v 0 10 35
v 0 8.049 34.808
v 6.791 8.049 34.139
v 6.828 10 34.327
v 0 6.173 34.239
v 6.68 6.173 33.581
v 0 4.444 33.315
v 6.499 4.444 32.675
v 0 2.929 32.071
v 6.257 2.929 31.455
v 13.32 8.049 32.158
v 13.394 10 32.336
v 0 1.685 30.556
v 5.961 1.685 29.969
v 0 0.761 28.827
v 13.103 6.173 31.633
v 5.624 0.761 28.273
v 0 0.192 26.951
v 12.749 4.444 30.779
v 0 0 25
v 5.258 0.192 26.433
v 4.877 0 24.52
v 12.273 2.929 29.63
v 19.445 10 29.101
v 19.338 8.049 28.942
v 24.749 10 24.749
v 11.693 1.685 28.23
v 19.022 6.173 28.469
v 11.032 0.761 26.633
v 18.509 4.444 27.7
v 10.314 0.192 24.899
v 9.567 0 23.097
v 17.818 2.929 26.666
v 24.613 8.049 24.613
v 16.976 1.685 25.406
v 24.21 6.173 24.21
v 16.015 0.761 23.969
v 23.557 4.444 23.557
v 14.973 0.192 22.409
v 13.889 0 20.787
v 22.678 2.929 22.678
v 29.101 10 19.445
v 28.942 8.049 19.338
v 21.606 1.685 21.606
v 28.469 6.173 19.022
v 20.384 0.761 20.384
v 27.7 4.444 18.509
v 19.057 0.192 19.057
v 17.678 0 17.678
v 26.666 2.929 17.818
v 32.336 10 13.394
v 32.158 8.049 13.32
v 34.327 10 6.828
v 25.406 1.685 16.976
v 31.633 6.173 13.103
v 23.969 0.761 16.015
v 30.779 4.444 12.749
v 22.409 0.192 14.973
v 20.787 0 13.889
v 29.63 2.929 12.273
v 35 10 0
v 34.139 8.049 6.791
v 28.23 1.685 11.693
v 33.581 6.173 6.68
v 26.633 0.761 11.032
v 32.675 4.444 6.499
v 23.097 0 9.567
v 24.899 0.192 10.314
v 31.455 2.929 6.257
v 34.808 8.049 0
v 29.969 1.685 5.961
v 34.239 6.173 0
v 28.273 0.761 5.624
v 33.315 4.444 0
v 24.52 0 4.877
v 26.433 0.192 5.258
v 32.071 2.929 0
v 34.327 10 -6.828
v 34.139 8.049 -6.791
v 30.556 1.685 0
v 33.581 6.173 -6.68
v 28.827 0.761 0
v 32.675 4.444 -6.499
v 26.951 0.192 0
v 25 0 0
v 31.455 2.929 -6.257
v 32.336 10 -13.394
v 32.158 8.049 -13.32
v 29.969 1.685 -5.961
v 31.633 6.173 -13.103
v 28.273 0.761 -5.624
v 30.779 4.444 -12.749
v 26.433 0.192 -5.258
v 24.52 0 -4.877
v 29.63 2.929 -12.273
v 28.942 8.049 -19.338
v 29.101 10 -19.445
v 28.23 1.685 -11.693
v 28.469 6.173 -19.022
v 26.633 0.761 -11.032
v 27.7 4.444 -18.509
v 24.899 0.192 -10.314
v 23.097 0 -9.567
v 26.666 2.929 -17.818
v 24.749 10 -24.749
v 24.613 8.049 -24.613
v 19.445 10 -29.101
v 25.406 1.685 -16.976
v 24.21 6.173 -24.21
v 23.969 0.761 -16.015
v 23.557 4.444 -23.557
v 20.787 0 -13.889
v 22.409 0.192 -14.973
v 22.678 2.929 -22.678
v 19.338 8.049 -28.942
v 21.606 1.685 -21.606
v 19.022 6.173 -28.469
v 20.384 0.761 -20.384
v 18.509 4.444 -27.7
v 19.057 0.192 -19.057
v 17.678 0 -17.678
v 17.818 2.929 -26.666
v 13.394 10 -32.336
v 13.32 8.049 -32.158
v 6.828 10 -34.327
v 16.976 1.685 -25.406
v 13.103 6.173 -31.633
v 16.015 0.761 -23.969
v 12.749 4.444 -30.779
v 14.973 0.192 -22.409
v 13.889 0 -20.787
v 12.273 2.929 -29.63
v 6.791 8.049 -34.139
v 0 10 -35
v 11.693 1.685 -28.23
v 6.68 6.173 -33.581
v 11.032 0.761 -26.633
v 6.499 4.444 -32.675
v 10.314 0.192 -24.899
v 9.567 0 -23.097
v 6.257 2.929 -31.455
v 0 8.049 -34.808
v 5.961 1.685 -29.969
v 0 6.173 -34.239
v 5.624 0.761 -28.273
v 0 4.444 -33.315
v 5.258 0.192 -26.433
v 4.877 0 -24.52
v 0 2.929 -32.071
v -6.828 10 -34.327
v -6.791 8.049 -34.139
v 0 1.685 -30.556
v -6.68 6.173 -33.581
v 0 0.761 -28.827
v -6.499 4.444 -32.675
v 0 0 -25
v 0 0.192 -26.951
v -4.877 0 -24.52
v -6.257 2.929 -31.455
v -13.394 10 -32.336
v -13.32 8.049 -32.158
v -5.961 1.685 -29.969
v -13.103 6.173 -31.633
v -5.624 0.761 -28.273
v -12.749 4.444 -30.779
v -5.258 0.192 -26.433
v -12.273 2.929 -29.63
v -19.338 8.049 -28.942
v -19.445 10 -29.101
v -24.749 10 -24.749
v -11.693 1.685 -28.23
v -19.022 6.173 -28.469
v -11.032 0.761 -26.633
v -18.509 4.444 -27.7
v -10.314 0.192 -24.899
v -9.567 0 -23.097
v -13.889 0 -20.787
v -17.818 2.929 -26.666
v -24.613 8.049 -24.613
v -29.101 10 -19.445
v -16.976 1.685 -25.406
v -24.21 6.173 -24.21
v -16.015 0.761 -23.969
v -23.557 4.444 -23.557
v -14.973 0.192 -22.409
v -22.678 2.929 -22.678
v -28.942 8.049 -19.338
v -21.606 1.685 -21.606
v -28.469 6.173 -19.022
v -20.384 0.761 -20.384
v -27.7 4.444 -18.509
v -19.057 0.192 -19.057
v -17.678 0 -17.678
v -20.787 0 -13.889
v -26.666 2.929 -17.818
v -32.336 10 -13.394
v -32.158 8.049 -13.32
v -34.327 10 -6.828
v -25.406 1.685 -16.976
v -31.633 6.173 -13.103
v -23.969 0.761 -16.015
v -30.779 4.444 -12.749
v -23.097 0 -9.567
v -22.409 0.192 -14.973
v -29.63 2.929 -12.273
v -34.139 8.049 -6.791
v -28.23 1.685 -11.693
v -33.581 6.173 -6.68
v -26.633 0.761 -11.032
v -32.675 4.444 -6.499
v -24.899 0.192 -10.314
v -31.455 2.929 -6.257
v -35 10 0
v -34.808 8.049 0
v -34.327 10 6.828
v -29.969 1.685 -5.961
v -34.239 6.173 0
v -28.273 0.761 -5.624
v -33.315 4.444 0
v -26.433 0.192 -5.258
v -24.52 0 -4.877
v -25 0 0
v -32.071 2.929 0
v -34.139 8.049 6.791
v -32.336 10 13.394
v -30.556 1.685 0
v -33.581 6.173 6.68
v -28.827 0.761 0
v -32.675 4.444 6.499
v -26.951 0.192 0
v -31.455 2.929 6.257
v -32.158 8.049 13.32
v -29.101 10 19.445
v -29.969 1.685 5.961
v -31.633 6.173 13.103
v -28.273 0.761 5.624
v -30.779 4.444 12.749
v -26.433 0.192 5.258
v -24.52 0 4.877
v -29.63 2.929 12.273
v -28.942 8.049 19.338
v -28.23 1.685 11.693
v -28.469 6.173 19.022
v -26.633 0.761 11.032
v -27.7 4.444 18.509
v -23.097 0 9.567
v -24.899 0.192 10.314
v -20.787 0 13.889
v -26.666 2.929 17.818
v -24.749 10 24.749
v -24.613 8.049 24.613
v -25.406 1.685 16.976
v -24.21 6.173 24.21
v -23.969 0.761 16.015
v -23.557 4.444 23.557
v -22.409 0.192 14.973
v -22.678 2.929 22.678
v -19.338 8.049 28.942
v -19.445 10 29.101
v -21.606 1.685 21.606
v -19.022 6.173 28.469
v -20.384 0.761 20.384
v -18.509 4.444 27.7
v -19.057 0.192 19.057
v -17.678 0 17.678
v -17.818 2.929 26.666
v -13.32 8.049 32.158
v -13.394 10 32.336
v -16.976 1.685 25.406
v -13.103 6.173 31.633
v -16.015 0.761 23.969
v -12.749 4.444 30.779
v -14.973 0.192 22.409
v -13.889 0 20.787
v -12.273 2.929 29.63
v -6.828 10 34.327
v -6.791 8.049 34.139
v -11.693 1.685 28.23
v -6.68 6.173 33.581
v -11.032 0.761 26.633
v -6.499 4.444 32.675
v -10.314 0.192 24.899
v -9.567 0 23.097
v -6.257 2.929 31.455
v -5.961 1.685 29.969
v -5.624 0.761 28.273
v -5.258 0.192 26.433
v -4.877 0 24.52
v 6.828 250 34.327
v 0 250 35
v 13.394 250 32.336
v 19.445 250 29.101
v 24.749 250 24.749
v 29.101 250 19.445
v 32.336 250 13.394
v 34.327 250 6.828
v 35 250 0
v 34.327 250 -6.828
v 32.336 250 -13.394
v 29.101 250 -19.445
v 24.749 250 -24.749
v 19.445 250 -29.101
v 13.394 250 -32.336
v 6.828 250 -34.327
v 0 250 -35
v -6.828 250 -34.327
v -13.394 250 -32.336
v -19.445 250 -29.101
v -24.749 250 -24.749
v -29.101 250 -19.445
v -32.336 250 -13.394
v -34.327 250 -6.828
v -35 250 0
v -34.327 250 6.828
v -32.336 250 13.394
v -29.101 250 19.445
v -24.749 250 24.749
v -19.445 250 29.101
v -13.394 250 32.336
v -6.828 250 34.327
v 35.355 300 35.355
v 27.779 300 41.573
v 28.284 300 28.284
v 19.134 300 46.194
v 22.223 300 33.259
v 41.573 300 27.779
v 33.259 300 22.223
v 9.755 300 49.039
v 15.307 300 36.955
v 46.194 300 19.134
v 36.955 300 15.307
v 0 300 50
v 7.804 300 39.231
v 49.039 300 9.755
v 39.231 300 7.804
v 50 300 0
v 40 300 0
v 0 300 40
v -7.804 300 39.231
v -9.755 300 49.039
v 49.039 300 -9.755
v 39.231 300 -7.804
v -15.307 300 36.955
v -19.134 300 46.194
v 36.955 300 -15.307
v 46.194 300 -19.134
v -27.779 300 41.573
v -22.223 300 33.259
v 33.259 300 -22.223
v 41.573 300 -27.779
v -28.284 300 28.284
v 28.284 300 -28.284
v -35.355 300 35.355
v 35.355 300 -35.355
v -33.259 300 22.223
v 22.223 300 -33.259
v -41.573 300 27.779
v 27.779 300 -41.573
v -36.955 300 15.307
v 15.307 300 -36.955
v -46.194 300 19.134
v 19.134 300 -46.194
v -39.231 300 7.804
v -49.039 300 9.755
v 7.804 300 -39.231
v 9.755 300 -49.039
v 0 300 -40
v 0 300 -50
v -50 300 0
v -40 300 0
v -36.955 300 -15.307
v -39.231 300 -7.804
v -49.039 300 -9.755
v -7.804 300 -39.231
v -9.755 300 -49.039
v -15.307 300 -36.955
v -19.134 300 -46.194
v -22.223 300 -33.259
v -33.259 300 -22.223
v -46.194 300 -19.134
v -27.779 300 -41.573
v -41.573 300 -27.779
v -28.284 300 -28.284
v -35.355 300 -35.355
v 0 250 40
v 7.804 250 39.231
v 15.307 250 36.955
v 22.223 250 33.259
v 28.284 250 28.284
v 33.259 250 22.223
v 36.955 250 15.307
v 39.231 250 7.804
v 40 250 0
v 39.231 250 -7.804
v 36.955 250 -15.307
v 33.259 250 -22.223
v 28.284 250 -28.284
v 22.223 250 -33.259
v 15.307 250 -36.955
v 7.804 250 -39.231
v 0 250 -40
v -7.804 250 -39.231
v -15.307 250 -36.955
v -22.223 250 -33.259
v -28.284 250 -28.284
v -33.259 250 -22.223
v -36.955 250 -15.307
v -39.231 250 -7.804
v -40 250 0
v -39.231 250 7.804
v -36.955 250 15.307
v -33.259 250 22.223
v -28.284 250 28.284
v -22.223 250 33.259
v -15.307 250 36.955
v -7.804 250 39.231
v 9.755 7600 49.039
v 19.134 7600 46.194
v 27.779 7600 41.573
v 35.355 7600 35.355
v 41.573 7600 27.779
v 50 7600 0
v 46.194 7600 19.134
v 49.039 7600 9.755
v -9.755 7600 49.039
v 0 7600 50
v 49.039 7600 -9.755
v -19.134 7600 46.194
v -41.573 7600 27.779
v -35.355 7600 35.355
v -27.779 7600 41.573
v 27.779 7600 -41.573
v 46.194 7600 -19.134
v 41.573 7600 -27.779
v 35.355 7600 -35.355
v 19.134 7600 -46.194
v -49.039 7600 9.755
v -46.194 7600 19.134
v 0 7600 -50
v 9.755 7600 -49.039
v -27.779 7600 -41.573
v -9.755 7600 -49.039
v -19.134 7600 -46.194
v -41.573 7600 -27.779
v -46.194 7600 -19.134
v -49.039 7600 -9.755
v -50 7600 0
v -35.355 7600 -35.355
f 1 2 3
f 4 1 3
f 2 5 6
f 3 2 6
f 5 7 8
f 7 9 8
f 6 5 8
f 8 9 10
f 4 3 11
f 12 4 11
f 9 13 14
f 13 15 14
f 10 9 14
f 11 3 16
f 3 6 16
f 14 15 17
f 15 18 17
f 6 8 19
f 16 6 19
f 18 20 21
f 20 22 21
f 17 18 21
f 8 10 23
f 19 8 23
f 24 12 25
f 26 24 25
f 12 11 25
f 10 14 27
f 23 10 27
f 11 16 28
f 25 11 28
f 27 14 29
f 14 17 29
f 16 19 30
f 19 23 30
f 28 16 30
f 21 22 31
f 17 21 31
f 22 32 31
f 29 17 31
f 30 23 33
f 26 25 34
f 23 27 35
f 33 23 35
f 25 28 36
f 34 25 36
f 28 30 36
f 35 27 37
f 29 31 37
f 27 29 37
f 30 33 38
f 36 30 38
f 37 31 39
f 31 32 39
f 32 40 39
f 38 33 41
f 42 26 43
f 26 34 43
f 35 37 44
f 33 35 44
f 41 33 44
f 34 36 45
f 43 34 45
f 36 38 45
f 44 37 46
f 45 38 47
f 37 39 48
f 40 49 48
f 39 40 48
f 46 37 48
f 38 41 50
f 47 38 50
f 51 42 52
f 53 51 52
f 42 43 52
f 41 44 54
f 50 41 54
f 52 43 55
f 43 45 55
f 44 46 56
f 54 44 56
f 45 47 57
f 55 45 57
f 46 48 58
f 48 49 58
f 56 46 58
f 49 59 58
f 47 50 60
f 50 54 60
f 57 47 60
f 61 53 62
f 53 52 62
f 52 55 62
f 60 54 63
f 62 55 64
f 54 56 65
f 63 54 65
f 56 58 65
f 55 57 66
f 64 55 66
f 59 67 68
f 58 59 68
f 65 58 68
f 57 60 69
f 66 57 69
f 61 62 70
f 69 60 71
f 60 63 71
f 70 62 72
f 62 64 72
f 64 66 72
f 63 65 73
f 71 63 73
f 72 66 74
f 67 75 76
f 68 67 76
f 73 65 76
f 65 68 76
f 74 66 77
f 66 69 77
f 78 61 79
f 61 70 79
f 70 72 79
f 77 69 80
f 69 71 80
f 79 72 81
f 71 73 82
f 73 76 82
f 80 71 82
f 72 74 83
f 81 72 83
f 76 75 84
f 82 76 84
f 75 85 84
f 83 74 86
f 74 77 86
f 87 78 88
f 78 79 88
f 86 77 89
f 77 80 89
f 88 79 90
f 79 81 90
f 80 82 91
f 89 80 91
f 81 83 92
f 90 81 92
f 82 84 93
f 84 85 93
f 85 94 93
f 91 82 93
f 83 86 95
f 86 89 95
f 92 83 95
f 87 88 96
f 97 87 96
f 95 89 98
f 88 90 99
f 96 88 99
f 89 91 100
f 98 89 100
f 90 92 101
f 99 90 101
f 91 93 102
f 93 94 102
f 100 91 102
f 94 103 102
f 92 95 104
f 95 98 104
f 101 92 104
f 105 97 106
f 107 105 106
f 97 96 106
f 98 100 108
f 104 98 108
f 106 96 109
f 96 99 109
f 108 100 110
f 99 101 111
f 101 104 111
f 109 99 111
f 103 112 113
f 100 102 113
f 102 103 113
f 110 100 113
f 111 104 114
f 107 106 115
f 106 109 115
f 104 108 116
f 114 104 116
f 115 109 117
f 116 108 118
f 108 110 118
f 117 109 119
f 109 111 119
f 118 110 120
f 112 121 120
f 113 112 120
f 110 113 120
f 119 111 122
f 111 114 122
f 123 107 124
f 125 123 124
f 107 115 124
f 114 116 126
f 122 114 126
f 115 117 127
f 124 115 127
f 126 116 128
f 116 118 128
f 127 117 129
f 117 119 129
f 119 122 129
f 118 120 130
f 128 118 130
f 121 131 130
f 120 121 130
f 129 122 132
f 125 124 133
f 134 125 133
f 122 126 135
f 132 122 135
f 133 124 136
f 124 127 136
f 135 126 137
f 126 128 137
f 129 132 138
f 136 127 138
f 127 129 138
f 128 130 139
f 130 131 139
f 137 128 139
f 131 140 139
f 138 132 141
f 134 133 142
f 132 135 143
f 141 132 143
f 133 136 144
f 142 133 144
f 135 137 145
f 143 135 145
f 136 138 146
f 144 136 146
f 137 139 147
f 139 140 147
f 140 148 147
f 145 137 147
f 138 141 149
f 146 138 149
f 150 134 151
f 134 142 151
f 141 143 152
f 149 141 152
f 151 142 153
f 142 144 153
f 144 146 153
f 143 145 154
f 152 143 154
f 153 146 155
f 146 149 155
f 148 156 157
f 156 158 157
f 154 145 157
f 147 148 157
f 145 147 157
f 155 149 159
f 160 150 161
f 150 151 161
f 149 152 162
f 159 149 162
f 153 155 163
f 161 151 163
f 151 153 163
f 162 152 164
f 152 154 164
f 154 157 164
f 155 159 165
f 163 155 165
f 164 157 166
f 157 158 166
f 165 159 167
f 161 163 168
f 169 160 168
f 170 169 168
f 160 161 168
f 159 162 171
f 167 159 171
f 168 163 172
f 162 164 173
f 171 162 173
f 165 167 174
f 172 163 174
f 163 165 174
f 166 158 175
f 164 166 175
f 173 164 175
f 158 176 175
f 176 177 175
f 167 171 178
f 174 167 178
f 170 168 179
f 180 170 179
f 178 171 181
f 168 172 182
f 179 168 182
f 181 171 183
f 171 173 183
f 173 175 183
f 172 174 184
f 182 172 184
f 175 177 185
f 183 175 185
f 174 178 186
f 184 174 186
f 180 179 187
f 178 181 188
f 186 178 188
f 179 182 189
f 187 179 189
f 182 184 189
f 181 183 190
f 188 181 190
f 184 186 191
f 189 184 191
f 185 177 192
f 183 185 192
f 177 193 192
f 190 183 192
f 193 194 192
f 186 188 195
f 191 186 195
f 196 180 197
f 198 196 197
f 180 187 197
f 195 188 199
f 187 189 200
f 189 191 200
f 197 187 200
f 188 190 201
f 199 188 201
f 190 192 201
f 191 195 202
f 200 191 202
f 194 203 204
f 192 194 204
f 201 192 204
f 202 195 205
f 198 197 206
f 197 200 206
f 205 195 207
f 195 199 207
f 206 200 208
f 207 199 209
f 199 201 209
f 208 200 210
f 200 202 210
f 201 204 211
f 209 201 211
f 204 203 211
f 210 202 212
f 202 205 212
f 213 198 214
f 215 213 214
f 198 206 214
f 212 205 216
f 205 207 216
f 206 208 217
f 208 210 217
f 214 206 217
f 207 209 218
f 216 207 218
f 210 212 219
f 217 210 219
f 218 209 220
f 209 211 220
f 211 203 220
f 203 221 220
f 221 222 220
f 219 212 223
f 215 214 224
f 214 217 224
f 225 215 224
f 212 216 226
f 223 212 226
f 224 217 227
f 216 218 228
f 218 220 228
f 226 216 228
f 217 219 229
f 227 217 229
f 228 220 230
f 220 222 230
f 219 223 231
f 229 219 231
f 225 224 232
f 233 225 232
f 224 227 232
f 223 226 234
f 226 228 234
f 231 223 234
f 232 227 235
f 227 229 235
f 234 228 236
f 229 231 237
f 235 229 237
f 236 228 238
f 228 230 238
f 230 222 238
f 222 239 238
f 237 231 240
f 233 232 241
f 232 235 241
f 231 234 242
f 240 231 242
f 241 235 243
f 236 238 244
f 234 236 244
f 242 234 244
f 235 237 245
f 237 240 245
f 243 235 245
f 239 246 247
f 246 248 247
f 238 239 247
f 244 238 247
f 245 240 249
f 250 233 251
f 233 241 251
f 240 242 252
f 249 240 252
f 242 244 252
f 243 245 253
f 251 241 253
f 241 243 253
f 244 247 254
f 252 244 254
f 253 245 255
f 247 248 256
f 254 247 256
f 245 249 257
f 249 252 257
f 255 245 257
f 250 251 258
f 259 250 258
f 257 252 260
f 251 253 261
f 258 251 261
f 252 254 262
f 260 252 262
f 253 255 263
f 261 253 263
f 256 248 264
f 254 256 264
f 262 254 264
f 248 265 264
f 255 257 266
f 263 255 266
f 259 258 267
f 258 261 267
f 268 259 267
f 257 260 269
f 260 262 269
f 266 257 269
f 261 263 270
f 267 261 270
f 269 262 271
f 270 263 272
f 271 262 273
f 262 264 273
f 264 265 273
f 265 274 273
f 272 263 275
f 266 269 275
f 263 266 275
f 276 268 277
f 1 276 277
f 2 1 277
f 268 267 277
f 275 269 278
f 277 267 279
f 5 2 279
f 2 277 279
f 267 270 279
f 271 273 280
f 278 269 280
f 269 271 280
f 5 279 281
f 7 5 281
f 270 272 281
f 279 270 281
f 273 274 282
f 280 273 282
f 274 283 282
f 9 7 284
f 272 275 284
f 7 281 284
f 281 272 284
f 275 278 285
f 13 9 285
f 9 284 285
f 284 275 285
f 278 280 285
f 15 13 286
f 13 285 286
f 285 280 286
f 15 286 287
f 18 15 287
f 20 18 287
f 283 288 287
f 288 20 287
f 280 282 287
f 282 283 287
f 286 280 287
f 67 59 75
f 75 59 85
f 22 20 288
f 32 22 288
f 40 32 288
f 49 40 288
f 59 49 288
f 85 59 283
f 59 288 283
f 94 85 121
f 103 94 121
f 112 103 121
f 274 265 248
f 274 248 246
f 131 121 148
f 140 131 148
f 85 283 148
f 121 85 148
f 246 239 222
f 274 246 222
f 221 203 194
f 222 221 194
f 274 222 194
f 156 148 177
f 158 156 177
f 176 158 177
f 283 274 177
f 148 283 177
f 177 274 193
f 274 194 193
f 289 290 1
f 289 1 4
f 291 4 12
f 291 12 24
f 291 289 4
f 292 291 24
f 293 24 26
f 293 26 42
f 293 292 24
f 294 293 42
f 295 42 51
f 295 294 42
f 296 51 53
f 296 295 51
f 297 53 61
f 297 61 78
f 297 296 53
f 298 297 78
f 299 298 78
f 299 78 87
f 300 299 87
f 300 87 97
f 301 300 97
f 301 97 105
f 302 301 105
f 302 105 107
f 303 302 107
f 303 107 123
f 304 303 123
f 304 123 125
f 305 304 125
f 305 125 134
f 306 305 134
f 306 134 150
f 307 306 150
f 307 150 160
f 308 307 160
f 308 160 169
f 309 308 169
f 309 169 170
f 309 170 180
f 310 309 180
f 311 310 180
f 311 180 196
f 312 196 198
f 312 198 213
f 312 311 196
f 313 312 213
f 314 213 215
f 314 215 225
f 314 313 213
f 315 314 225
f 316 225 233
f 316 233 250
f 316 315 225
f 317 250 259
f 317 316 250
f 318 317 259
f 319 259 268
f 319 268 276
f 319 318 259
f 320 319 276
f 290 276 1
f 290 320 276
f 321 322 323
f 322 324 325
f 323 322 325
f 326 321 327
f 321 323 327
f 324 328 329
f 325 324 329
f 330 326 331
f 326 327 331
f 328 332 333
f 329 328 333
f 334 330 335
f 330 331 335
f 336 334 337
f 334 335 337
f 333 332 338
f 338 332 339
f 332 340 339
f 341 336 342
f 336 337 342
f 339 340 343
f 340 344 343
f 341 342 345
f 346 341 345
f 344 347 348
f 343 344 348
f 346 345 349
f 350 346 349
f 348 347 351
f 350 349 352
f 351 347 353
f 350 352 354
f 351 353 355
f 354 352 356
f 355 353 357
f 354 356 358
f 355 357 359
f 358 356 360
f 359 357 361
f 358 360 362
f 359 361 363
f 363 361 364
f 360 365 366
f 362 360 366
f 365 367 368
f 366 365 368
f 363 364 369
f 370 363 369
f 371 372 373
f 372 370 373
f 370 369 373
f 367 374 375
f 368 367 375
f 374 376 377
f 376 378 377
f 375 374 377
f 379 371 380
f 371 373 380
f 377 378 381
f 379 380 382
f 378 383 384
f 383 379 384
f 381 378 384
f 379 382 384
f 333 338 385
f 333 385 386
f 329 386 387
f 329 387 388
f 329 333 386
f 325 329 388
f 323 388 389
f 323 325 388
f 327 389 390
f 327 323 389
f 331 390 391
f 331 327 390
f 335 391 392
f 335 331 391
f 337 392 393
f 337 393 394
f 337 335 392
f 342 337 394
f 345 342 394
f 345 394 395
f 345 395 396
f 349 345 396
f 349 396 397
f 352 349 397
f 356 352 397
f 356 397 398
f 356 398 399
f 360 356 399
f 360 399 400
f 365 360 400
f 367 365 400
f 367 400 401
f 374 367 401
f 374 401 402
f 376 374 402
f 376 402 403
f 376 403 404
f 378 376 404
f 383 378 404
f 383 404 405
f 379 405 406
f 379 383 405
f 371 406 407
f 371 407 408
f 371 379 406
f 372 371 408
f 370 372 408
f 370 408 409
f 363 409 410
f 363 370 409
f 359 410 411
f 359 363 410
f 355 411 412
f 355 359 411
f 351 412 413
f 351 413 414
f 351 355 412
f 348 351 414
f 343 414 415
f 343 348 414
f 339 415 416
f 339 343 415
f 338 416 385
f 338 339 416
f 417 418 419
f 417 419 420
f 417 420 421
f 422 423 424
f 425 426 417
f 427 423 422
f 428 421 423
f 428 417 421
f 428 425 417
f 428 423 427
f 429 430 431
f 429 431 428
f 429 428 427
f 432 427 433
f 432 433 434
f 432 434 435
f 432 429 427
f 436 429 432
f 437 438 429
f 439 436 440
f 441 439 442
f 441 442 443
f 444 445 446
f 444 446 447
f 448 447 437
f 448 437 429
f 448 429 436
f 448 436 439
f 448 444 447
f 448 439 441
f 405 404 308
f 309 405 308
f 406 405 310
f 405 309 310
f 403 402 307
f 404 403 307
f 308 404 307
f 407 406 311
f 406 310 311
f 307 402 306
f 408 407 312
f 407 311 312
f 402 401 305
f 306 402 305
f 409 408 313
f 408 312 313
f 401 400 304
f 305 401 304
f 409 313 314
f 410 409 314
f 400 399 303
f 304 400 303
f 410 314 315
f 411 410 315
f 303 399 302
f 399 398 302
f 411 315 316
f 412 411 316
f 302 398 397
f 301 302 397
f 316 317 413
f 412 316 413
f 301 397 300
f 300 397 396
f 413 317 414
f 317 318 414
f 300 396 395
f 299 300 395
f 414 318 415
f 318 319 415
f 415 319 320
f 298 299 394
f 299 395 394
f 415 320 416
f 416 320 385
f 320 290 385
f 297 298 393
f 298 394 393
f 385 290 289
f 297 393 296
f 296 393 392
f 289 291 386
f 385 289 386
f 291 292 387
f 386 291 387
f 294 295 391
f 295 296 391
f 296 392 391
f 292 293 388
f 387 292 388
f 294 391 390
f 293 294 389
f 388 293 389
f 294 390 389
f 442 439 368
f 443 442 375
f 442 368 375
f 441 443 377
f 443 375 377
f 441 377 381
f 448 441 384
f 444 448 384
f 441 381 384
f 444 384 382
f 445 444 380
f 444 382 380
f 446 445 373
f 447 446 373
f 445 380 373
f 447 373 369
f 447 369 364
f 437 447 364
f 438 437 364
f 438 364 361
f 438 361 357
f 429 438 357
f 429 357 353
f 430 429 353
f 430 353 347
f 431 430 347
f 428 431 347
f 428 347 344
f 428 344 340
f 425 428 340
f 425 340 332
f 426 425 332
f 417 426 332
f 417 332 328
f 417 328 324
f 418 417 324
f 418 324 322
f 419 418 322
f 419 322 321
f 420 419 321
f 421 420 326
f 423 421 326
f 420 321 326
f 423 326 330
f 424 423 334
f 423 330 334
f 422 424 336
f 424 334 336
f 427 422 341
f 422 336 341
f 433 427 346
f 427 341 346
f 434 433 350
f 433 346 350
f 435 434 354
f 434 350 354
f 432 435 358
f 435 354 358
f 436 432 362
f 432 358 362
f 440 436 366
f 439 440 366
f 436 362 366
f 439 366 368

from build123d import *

# Parameters (mm, degrees)
SKETCH_1_R          = 50
EXTRUDE_1_DEPTH     = 7600
SKETCH_3_R          = 50
SKETCH_3_R_2        = 40
CUT_EXTRUDE_1_DEPTH = 7301.342457721
SKETCH_4_R          = 40
SKETCH_4_R_2        = 35
CUT_EXTRUDE_2_DEPTH = 7351.340128185
FILLET_1_R          = 10


with BuildPart() as part:
    # ｽｹｯﾁ1 → ﾎﾞｽ - 押し出し1 (new body)
    with BuildSketch(Plane(origin=(0, 0, 0), x_dir=(1, 0, 0), z_dir=(0, 1, 0))):
        Circle(SKETCH_1_R)
    extrude(amount=EXTRUDE_1_DEPTH)

    # ｽｹｯﾁ3 → ｶｯﾄ - 押し出し1 (cut, through all)
    with BuildSketch(Plane(origin=(0, 300, 0), x_dir=(1, 0, 0), z_dir=(0, 1, 0))):
        Circle(SKETCH_3_R)
        Circle(SKETCH_3_R_2, mode=Mode.SUBTRACT)
    extrude(amount=-CUT_EXTRUDE_1_DEPTH, mode=Mode.SUBTRACT)

    # ｽｹｯﾁ4 → ｶｯﾄ - 押し出し2 (cut, through all)
    with BuildSketch(Plane(origin=(0, 250, 0), x_dir=(1, 0, 0), z_dir=(0, 1, 0))):
        Circle(SKETCH_4_R)
        Circle(SKETCH_4_R_2, mode=Mode.SUBTRACT)
    extrude(amount=-CUT_EXTRUDE_2_DEPTH, mode=Mode.SUBTRACT)

    # ﾌｨﾚｯﾄ1
    fillet_1_edges = [part.edges().sort_by_distance(p)[0] for p in [
        (-35, 0, 0),
    ]]
    fillet(fillet_1_edges, radius=FILLET_1_R)


solid = part.part
